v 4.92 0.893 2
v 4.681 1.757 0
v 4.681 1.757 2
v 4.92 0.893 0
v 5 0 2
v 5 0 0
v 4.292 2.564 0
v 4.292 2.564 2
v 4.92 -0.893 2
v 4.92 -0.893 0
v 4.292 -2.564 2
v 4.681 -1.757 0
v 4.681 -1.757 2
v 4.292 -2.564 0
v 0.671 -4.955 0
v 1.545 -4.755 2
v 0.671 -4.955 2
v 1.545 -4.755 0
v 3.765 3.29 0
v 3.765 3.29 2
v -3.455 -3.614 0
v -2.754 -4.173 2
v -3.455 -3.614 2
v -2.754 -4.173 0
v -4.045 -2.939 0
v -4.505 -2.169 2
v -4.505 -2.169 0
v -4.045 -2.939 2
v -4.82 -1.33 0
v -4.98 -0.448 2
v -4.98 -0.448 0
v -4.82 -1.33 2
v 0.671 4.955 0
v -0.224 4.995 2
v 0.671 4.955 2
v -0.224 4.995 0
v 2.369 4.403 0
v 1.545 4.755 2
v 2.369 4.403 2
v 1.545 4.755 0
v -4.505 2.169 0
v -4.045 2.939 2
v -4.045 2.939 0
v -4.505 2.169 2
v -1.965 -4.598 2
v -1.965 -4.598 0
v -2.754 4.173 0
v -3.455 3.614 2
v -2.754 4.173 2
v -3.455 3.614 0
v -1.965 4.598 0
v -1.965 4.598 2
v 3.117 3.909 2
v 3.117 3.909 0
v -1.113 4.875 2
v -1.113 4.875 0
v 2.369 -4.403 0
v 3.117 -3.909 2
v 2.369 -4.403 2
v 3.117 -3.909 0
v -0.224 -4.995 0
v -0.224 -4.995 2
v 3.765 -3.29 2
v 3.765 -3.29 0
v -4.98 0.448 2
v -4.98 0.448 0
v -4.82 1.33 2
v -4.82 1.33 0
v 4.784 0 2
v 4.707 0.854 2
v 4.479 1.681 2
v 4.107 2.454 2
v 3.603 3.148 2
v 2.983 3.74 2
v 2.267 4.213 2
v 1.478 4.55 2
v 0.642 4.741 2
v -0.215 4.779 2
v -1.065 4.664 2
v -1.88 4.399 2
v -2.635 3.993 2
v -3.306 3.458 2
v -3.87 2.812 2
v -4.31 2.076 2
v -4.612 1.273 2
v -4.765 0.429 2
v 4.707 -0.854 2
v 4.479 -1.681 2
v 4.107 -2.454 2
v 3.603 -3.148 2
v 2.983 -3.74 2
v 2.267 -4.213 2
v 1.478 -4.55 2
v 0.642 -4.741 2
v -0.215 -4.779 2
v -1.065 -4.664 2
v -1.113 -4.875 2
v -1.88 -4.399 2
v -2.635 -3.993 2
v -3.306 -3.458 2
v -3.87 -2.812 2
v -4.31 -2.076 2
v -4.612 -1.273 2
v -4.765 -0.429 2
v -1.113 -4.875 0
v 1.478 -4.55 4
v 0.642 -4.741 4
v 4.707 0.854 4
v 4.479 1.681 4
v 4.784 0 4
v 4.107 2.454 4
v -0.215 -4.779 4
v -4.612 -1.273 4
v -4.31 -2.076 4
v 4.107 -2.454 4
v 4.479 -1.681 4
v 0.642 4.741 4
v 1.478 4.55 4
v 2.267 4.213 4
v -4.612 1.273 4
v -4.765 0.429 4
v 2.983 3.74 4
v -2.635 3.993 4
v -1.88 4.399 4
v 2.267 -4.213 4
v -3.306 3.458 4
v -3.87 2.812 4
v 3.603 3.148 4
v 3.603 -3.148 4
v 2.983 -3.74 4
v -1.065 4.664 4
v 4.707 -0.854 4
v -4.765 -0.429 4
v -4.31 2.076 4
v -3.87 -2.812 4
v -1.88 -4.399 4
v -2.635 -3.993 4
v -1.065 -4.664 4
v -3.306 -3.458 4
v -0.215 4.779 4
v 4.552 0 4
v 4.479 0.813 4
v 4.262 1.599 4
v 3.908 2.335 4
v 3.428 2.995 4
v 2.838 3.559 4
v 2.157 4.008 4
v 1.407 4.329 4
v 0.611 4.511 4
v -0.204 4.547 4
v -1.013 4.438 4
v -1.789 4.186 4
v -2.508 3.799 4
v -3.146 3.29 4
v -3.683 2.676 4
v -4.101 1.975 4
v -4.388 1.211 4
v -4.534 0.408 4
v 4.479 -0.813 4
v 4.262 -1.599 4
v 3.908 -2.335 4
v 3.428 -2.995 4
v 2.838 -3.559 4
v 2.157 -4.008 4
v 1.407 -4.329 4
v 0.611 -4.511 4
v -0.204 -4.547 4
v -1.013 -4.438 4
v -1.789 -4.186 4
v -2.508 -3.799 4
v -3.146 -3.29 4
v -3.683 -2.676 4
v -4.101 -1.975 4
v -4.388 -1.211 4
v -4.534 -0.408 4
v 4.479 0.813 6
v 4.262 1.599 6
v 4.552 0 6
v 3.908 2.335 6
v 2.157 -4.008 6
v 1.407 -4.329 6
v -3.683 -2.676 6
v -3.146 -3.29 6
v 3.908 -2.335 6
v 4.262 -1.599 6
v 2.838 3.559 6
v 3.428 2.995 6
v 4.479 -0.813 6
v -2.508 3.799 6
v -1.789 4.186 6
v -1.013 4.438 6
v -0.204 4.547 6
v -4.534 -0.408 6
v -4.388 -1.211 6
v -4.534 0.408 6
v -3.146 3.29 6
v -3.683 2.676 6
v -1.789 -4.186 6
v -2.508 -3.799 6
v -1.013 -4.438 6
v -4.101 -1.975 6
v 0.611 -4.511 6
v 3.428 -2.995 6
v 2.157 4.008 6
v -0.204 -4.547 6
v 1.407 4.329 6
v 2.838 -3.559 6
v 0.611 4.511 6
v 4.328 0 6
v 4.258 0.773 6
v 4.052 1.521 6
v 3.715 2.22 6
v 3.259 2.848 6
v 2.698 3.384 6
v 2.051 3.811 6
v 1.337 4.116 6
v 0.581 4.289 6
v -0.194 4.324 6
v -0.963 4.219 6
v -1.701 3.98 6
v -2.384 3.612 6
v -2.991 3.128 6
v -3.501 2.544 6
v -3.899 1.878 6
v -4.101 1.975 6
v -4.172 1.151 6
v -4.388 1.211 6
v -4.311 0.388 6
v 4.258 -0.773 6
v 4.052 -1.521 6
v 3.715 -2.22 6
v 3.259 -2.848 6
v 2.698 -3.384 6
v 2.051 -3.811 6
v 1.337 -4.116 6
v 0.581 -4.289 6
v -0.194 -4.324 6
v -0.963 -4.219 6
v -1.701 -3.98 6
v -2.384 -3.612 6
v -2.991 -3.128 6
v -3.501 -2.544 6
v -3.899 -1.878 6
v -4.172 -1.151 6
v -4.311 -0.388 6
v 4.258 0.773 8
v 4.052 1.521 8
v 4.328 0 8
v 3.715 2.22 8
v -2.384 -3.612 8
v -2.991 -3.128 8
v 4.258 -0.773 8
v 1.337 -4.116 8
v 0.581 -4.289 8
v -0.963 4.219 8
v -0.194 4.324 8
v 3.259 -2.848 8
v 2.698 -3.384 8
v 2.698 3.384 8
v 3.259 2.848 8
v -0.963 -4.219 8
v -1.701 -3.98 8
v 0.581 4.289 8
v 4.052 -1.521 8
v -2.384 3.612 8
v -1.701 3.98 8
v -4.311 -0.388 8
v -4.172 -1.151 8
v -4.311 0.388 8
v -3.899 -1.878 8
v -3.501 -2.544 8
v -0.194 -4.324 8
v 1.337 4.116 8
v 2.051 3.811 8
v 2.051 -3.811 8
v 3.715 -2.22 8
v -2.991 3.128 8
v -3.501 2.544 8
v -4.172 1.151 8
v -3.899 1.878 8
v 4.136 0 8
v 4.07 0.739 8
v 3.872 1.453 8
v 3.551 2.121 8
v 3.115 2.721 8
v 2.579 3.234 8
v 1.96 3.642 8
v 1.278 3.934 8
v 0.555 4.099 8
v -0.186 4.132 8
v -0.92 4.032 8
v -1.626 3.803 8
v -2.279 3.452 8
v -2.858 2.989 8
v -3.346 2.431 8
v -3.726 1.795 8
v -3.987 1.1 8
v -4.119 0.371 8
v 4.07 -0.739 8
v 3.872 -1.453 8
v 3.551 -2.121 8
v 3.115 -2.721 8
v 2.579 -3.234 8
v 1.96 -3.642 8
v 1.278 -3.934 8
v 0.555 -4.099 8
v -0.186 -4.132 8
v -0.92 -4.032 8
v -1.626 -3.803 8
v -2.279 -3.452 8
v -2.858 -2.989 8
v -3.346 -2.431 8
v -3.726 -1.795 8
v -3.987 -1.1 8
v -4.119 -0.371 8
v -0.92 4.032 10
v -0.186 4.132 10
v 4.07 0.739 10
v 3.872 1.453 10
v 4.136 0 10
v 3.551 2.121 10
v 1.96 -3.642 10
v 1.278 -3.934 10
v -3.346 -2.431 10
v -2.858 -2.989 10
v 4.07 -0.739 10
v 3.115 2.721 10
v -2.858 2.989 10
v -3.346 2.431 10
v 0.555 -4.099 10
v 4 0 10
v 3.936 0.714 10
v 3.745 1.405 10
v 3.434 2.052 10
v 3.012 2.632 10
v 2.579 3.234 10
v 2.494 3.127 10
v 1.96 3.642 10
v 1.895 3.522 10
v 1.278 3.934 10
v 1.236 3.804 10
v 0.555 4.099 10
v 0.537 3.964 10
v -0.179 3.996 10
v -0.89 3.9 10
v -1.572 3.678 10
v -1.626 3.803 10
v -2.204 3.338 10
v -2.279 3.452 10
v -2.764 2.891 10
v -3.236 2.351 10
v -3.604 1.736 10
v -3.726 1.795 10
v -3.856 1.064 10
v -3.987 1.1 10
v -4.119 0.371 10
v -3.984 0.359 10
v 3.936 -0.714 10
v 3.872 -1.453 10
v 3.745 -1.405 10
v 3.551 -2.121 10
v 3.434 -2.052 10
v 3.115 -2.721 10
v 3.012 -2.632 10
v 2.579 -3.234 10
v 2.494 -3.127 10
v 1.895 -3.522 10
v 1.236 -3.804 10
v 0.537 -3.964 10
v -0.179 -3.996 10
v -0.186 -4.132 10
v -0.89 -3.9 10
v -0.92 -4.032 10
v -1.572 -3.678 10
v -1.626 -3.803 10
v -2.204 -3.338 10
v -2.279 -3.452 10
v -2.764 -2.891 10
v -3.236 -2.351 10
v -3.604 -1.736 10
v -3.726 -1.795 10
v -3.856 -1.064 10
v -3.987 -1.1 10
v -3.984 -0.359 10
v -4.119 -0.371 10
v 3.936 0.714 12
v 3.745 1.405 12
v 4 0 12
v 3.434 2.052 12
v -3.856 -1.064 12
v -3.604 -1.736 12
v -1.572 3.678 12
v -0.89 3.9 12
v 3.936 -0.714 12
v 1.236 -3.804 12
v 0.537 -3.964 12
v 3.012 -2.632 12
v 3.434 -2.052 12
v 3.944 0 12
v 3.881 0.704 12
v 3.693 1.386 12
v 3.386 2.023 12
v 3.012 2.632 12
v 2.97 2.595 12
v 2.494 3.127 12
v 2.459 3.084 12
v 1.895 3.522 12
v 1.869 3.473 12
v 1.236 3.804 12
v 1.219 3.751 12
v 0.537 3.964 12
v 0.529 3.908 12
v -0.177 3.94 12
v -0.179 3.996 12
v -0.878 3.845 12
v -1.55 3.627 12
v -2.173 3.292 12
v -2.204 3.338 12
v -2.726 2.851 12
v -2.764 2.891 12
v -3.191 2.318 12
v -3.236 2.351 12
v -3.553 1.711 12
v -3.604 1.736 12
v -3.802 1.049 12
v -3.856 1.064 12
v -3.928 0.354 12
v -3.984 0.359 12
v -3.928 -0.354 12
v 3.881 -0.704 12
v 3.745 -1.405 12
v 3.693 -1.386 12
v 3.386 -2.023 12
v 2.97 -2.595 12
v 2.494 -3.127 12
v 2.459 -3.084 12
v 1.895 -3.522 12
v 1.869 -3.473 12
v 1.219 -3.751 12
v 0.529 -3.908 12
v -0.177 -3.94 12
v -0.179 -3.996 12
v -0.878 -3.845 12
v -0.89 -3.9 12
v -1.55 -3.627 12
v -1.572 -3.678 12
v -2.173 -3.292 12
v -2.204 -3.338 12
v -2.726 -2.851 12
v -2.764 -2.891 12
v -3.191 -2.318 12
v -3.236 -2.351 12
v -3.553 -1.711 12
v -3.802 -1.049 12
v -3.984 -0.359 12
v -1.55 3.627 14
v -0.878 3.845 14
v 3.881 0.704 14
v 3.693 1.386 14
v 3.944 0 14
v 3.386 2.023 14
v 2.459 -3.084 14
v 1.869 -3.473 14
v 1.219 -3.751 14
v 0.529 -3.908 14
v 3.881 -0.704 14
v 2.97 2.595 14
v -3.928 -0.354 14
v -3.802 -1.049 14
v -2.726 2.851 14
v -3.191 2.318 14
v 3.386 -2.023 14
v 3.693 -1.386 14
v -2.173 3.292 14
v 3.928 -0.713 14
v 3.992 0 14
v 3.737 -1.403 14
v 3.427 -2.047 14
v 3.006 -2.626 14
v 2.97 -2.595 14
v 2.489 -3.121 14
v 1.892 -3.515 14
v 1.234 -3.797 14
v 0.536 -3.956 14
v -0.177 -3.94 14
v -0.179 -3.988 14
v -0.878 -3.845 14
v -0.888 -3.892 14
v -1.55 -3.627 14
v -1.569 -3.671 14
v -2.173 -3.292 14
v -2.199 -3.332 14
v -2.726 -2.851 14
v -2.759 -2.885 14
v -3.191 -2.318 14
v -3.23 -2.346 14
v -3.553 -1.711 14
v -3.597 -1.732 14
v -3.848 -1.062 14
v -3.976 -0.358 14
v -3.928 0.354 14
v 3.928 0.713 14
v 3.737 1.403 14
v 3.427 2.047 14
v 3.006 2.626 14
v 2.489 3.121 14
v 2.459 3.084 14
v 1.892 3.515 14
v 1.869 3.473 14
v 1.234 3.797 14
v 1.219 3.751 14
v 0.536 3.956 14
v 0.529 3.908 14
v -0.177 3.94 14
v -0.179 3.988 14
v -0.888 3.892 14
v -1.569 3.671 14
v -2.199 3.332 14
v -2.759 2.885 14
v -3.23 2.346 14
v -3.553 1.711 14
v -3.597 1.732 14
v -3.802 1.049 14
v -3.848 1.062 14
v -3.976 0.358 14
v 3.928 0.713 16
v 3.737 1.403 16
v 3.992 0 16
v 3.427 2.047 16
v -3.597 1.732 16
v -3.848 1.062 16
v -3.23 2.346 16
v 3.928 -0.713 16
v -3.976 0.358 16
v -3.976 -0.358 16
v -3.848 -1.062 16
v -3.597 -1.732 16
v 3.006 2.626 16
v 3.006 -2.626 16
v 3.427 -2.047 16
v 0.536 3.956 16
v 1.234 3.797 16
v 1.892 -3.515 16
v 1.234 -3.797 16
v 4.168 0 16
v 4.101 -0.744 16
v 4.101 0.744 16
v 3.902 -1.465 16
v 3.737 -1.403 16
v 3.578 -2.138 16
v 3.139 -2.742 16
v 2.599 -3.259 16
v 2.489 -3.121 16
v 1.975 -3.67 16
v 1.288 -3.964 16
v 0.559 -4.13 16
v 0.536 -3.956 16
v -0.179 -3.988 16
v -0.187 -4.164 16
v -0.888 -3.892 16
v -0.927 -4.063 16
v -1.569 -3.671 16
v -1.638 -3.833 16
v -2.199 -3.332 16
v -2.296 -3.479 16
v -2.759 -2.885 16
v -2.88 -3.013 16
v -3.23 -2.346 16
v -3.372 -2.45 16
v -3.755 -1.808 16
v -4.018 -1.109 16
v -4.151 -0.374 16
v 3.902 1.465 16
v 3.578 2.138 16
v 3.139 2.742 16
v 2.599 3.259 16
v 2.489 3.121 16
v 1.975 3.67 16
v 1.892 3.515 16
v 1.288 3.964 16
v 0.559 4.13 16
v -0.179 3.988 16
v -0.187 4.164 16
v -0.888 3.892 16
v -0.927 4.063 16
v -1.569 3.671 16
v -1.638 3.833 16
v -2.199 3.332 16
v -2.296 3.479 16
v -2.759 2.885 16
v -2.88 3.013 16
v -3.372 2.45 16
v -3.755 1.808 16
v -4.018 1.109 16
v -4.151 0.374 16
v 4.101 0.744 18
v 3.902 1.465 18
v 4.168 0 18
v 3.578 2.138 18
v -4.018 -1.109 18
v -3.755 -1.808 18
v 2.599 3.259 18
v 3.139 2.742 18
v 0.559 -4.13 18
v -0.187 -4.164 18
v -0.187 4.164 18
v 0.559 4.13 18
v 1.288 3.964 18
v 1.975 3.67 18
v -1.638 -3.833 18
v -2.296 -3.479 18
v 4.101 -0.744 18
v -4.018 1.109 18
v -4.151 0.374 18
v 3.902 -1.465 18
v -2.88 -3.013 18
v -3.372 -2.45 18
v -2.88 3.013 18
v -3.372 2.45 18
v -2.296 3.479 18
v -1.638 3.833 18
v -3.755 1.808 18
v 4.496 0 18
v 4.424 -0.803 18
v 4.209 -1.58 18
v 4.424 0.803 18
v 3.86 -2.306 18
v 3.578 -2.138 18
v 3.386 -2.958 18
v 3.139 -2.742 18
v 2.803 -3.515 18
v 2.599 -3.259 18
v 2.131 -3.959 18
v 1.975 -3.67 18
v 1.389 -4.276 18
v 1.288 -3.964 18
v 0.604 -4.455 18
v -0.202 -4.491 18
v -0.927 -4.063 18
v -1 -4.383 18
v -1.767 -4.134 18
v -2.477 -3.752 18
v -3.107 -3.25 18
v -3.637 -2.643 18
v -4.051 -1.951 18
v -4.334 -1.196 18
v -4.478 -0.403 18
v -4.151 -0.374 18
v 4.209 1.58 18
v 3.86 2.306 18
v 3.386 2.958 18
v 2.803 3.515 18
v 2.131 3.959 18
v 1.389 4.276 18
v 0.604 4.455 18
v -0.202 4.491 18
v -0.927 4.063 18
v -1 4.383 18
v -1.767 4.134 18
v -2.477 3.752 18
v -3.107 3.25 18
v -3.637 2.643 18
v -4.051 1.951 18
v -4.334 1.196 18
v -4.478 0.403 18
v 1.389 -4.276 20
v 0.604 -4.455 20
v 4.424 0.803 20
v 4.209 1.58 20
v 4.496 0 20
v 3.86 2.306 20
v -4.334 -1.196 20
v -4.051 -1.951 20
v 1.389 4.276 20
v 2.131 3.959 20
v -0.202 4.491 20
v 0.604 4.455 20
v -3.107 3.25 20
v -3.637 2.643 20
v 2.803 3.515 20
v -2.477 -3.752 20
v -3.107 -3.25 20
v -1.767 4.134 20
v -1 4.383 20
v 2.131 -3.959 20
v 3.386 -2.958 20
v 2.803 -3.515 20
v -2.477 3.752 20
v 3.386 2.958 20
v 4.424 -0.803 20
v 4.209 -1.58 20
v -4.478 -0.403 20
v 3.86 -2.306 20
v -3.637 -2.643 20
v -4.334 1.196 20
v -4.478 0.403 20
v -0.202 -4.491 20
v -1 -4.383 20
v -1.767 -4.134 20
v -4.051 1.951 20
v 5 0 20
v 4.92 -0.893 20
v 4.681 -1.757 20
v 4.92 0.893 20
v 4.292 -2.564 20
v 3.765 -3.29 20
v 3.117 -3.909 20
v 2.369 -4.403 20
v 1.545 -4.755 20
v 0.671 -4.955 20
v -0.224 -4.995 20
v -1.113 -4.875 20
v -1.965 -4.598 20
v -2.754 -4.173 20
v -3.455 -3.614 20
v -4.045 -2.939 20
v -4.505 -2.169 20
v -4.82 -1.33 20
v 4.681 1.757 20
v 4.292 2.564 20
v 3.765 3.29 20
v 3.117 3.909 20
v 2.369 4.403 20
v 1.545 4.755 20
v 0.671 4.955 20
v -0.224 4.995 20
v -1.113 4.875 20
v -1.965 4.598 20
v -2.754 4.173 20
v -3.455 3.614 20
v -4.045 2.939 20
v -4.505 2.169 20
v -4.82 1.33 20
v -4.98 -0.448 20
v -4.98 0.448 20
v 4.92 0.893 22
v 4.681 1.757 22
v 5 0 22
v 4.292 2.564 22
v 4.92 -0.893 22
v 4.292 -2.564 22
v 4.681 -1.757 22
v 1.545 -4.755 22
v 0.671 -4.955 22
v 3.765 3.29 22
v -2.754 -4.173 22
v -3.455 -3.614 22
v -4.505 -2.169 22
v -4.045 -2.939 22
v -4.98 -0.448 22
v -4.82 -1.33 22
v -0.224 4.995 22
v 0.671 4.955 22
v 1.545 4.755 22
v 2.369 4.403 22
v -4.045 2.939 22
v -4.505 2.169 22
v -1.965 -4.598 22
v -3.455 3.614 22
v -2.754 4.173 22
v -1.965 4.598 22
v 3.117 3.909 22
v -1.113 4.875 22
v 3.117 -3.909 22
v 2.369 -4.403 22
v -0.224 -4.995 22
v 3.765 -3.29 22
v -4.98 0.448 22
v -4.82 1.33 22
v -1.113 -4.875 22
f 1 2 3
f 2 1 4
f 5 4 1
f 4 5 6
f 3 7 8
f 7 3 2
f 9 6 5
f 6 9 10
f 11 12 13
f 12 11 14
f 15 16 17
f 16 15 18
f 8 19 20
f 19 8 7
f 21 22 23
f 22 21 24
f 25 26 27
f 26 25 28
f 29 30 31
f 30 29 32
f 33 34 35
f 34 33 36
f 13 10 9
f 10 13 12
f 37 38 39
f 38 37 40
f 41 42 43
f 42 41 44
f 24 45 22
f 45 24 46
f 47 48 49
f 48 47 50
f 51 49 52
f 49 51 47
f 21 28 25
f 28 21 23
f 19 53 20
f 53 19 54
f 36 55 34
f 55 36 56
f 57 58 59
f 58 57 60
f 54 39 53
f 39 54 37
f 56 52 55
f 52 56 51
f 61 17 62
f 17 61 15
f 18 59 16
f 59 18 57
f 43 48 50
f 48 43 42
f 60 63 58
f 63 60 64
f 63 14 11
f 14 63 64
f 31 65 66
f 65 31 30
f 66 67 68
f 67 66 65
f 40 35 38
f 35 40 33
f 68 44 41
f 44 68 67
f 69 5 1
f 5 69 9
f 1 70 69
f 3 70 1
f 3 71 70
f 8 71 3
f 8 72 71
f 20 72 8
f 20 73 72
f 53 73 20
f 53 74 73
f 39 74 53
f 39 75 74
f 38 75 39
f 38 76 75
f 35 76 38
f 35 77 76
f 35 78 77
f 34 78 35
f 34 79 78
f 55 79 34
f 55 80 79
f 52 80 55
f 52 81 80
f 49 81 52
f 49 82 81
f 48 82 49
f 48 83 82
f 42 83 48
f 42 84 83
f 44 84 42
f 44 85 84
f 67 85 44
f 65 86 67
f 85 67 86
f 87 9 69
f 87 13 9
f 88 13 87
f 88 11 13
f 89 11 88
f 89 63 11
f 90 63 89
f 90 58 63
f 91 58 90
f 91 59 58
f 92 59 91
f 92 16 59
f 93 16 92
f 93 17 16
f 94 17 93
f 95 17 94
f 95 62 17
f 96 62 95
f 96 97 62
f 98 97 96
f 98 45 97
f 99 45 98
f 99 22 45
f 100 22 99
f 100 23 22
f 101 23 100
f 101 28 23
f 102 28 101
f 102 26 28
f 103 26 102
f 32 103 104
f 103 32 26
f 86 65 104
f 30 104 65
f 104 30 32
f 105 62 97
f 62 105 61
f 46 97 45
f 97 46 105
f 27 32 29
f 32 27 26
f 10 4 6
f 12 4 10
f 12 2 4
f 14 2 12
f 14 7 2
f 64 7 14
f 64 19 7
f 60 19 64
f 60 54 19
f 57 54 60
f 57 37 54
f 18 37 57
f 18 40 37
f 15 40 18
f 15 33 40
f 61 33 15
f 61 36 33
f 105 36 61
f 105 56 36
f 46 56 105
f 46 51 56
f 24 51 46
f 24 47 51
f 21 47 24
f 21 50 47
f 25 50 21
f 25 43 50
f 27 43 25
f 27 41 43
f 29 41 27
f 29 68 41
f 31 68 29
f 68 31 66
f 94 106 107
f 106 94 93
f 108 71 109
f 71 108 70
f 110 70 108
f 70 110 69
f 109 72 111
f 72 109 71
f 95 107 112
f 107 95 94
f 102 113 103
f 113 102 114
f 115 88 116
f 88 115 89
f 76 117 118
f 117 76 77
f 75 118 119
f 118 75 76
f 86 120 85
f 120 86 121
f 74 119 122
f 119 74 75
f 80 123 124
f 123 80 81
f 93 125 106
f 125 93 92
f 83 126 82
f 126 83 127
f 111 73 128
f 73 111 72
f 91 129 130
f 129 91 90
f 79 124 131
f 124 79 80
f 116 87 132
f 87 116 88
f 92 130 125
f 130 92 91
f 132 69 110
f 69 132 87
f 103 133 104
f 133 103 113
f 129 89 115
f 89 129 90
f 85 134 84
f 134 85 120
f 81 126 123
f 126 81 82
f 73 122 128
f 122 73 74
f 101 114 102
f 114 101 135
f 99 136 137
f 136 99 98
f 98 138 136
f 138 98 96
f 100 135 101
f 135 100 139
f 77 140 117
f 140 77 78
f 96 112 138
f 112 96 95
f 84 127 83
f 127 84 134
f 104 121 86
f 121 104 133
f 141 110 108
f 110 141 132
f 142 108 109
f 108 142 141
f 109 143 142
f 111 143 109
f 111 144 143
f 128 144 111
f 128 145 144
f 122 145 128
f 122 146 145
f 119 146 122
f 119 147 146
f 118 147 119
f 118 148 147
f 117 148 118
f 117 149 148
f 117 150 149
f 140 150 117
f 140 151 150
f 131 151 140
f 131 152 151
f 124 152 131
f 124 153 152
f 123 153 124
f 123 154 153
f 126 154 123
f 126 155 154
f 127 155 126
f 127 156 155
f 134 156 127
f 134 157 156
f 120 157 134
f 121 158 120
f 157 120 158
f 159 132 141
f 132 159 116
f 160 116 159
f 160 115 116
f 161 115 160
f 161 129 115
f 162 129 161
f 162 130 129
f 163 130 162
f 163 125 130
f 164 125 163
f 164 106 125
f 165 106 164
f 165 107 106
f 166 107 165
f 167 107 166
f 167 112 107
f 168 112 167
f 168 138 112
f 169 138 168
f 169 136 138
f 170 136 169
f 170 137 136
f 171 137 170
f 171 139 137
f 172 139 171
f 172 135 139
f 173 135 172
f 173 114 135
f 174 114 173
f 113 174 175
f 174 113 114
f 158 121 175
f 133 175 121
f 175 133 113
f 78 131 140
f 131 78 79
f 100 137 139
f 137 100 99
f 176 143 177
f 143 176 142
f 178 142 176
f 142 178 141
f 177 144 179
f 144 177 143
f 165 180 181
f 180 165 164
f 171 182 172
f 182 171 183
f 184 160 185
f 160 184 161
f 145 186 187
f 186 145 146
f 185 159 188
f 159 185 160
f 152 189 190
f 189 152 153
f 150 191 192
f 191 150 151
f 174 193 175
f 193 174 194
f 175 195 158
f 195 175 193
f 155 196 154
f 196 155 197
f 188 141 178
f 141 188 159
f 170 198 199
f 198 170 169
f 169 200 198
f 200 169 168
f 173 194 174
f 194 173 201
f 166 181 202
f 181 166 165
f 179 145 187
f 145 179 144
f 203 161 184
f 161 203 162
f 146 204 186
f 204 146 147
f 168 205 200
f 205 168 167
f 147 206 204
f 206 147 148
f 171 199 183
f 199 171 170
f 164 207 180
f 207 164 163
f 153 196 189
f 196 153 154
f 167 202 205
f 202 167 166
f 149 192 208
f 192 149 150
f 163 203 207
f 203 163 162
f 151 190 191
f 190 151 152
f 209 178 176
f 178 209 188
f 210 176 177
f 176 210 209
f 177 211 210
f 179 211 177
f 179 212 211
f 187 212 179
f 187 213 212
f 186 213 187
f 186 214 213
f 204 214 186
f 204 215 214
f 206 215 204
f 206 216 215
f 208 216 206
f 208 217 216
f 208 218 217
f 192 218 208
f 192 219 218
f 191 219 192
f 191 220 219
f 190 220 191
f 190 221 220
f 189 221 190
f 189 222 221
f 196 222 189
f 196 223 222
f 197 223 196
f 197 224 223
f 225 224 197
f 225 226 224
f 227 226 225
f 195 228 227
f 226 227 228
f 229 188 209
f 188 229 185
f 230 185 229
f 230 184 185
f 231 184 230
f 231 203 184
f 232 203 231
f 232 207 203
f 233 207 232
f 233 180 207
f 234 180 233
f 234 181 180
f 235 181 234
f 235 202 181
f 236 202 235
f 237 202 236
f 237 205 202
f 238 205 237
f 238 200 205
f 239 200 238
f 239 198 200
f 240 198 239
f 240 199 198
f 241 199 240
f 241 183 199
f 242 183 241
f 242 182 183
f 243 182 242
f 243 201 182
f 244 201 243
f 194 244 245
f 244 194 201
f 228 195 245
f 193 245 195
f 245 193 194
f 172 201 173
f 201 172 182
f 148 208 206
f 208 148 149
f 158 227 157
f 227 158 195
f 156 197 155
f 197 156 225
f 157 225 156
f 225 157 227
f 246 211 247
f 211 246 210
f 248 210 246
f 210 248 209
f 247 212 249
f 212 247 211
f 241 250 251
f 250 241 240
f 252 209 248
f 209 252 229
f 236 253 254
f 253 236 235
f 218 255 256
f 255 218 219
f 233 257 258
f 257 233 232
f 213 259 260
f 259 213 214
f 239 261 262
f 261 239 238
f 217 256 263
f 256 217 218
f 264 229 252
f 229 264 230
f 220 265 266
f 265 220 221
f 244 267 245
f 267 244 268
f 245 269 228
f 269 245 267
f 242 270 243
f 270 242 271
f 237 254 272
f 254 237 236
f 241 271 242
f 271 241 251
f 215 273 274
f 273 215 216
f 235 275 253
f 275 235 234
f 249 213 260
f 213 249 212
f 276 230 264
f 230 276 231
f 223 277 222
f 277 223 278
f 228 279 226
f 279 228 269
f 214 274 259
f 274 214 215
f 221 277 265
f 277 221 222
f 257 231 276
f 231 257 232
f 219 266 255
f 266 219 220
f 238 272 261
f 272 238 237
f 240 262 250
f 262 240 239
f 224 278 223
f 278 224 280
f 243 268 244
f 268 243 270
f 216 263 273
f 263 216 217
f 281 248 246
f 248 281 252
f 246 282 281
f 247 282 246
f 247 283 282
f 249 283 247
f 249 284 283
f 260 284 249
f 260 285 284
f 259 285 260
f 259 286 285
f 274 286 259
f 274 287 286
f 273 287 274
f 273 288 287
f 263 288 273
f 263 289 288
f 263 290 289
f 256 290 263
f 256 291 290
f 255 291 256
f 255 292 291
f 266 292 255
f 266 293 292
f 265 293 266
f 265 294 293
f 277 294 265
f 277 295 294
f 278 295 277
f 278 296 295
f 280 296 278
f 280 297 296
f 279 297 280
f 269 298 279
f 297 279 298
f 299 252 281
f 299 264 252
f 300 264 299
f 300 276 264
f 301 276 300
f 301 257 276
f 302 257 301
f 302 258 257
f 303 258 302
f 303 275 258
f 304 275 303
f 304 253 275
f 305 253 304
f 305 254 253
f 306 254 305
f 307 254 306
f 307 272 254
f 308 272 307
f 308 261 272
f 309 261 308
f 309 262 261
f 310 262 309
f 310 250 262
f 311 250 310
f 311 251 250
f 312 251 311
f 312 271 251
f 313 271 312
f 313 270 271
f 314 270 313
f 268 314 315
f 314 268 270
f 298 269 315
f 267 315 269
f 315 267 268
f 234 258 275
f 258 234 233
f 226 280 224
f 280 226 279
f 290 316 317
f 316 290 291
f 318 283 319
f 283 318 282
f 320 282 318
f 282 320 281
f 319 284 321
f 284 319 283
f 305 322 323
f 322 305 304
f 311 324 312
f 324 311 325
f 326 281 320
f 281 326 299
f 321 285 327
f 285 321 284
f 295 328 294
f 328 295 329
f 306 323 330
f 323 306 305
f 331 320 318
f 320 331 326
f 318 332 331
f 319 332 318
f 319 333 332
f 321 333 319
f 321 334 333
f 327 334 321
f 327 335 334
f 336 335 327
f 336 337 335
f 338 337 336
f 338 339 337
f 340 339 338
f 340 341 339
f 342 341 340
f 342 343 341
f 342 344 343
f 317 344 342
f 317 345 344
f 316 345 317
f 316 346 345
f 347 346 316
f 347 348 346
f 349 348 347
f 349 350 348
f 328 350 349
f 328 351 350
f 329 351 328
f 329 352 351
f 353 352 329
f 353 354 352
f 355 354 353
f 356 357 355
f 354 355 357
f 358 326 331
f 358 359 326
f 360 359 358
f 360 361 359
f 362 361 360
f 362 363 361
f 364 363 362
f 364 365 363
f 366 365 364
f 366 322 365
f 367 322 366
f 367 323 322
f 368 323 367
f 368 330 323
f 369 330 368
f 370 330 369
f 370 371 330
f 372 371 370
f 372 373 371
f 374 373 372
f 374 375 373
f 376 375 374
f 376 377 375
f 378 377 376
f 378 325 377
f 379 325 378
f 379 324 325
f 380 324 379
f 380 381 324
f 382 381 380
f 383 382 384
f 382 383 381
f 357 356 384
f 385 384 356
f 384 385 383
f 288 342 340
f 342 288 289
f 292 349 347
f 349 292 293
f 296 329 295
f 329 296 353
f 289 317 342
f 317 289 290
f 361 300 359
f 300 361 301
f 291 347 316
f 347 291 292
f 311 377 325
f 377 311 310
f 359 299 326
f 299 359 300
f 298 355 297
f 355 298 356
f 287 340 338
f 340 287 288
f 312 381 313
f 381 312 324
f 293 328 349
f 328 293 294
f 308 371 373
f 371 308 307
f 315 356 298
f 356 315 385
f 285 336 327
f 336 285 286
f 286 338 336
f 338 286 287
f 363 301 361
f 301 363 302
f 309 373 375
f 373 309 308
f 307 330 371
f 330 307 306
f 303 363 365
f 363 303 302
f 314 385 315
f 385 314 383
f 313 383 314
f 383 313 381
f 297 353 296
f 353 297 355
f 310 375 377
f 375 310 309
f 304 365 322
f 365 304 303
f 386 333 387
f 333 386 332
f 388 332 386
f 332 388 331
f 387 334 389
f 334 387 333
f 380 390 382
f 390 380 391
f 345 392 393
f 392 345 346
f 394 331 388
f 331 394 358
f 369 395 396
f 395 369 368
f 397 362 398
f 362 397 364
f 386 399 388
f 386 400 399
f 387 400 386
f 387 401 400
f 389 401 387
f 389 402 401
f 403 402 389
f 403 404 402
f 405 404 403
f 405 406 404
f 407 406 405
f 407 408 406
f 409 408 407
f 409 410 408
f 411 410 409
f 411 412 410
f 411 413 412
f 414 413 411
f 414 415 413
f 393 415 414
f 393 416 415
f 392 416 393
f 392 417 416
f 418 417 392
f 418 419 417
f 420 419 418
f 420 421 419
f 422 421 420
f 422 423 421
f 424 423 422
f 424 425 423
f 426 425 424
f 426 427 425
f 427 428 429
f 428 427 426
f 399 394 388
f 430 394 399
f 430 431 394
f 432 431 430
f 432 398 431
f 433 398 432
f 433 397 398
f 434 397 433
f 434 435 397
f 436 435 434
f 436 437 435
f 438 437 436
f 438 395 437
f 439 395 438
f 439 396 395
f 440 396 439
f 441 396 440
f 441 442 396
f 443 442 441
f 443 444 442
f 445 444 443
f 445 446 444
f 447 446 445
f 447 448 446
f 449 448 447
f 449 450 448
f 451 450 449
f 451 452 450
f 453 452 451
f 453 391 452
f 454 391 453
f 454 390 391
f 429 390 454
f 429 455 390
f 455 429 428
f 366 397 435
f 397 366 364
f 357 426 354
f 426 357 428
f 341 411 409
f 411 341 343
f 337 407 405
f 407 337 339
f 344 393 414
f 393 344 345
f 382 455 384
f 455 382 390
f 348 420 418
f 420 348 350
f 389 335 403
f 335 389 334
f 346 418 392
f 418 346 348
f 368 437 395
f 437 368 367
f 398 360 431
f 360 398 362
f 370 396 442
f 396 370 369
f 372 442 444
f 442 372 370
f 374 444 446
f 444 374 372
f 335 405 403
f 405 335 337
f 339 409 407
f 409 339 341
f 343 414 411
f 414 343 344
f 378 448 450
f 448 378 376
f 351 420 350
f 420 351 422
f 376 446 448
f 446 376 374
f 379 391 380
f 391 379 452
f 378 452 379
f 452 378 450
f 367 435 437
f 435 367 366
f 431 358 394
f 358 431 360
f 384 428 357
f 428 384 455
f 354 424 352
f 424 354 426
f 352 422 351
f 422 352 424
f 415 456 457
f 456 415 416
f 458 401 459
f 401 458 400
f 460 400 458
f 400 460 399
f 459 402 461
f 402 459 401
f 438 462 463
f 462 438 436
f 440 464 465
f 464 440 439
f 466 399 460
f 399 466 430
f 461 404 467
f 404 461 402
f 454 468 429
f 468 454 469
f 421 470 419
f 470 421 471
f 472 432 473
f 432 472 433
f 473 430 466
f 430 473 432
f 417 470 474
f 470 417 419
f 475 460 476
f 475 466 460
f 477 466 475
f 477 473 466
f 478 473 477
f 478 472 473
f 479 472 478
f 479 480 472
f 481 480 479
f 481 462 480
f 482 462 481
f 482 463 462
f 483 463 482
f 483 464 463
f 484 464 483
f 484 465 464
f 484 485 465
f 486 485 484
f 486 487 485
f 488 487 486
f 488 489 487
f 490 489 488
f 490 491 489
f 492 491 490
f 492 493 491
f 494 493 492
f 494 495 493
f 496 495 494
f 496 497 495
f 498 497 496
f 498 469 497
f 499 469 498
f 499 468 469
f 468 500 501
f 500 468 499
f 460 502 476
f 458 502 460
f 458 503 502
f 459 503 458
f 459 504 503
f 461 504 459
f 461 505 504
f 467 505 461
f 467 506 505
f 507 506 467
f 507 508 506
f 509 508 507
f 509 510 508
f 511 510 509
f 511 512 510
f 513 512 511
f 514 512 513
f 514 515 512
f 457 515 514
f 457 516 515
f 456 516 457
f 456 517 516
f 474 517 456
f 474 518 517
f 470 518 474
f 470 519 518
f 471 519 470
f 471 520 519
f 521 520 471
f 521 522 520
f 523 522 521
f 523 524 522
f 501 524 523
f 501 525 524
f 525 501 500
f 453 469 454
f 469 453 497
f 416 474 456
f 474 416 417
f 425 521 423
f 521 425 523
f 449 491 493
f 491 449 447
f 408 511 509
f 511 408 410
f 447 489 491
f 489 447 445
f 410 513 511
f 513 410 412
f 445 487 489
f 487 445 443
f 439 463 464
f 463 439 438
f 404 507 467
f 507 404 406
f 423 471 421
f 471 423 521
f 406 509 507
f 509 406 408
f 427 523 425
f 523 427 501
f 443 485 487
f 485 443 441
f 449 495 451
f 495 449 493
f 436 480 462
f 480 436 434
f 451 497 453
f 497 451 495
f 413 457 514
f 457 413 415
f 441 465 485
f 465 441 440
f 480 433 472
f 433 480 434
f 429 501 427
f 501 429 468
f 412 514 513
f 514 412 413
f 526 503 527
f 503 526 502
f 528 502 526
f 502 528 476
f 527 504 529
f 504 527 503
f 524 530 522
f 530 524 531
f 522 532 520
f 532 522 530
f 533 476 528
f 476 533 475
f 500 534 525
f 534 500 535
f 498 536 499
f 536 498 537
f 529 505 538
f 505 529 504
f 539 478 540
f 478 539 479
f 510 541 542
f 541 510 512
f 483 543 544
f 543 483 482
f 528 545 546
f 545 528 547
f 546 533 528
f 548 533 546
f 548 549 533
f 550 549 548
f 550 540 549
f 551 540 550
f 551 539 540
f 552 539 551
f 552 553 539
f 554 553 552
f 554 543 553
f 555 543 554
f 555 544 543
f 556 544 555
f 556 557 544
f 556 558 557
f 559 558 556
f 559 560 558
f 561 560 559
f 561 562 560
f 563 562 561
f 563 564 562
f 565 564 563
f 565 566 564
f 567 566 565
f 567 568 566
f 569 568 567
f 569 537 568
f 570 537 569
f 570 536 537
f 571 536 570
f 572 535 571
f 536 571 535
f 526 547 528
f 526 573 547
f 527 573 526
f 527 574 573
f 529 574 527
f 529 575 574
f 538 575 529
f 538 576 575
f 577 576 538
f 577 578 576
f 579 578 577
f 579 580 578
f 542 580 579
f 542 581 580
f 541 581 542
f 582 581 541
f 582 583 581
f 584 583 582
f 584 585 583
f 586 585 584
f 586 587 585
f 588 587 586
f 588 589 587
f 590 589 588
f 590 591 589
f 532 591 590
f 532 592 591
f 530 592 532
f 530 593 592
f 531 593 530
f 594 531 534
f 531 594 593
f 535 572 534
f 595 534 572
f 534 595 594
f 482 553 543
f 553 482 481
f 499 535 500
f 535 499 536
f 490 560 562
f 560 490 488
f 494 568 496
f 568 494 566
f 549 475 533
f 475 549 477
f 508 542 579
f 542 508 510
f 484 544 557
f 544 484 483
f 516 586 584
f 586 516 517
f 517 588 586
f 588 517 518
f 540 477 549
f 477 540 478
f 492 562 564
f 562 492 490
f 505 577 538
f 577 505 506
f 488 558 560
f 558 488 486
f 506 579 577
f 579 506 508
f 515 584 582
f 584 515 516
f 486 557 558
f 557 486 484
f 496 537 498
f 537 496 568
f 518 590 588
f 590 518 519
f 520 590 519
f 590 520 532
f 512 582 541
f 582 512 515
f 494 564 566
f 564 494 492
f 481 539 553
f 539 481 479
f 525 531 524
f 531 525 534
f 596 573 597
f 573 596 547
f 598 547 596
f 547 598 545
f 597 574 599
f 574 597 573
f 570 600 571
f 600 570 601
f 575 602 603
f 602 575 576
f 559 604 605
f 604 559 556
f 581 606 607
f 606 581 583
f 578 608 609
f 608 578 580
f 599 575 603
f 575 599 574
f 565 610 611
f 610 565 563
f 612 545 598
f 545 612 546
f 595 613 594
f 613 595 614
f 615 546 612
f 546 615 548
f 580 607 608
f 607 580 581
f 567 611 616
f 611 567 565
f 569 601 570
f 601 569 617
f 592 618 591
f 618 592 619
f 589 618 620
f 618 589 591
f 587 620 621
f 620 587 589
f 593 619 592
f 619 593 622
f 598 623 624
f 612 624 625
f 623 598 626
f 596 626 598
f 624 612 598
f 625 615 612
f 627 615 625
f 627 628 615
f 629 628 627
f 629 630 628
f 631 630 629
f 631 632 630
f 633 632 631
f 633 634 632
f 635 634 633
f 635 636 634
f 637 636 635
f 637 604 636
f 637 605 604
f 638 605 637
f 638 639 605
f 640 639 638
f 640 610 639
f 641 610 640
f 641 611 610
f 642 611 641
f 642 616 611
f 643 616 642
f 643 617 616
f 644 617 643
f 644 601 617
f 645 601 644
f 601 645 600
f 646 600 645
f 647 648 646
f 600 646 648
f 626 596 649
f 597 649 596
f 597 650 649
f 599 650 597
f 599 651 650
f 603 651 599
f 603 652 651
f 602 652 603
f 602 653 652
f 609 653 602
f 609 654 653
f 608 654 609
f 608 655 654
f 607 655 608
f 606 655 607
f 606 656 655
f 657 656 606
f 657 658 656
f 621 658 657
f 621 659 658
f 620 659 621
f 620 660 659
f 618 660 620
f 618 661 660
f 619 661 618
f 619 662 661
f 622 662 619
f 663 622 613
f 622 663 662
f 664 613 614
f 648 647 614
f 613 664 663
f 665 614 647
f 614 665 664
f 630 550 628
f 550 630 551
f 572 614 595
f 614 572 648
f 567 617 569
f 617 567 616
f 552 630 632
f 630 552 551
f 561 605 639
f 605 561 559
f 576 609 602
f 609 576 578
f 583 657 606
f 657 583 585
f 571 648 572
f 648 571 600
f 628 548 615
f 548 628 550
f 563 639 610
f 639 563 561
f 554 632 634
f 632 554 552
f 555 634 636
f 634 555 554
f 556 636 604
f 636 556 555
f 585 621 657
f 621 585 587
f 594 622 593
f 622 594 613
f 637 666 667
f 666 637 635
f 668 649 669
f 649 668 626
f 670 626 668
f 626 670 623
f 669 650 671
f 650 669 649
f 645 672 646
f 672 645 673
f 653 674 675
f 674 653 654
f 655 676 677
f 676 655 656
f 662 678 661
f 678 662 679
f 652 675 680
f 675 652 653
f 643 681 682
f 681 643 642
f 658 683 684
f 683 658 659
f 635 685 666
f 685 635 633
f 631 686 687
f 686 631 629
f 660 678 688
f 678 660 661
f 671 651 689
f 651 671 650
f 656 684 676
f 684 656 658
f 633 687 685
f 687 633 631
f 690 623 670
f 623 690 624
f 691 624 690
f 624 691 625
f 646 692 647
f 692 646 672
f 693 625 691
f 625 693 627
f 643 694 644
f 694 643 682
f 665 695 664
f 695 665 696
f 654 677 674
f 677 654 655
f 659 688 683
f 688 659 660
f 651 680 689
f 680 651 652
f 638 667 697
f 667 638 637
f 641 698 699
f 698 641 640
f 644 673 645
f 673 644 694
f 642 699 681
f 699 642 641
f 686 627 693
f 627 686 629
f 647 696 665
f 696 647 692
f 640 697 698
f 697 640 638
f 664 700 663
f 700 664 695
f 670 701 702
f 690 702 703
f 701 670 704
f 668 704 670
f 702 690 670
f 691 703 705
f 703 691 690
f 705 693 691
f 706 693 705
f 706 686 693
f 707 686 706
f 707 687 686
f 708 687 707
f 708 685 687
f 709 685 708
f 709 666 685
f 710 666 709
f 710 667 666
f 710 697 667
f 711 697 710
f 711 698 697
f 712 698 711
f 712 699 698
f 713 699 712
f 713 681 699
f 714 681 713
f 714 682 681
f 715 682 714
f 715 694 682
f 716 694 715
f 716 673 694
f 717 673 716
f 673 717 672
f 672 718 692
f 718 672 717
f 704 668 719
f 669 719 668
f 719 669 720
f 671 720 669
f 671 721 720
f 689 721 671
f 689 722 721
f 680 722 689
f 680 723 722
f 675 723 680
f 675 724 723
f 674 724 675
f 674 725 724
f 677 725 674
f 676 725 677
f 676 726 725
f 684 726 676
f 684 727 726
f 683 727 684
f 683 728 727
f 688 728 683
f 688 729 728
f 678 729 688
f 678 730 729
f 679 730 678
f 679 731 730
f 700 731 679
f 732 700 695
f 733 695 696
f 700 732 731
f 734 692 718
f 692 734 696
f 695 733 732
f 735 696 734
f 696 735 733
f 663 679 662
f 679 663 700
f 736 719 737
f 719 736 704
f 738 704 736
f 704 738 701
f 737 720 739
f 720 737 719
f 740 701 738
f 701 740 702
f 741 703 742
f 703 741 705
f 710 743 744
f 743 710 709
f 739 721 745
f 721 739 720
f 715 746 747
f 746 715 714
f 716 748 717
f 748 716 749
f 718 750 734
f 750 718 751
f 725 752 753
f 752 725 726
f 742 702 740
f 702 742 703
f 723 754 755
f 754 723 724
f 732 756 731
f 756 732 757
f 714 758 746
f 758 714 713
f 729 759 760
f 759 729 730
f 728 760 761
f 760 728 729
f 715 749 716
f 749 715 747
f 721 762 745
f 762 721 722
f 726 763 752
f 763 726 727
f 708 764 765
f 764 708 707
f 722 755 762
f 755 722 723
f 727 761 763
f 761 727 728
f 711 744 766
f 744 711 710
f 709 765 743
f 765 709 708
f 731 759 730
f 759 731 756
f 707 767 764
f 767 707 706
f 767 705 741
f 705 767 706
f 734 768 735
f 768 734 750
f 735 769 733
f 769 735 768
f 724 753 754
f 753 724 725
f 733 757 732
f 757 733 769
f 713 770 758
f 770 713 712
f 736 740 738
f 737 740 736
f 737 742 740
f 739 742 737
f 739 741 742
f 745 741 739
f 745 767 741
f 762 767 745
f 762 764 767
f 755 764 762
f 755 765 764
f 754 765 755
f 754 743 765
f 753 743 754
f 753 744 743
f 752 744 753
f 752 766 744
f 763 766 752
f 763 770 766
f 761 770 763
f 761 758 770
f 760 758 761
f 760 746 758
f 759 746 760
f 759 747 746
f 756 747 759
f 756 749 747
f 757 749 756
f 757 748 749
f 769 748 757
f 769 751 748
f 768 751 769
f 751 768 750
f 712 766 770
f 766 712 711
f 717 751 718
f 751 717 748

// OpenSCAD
$fn=35;

module pinViaHeight(height, bottomDia, topDia, res, topForce, bottomForce) {
    /*height = 20;
    bottomDia = 7;
    topDia = 8;
    res = 90;
    topForce = 4;
    bottomForce = 3;*/

    echo();

    heightPerSlice = height/res;
    echo("heightPerSlice", heightPerSlice);
    /*
    //top and bottom slices
    cylinder(d=topDia, h=heightPerSlice);
    translate([0,0,height-heightPerSlice]) {
        cylinder(d=topDia, h=heightPerSlice);
    }
    */

    //middleSlices fixed values
    numberOfSlices = res;
    echo("numberOfSlices", numberOfSlices);

    bottomTotopDiaDifference = topDia-bottomDia;
    echo("bottomTotopDiaDifference", bottomTotopDiaDifference);

    DiaIncreaseFactorPerSlice = bottomTotopDiaDifference/(numberOfSlices);
    echo("DiaIncreaseFactorPerSlice", DiaIncreaseFactorPerSlice);

    forceSum = topForce+bottomForce;
    forceTop = topForce/forceSum;
    forceBottom = bottomForce/forceSum;

    echo ("forceSum",forceSum,forceTop,forceBottom);

    for(i= [0:numberOfSlices]) {

        /*forces are interpreted this way:
                                /\
                                || topForce
                                ||
                        ==================  <-- Slice
                        ==================
                                ||
                                || bottom force
                                \/
        */
        dia = DiaIncreaseFactorPerSlice*i+bottomDia;
        forcePartTop = (i/numberOfSlices)*forceTop;
        forcePartBottom = (1-(i/numberOfSlices))*forceBottom;
        p = forceSum*(forcePartTop+forcePartBottom);
        
        //function: f(i)= (-(1/(res/2))*(i-(res/2))^2+(res/2))/(res/2) --> starts and ends at top&bottom slice (=0), highest point at res/2 = 1

        echo("slice",i,p,forcePartTop,forcePartBottom);

        translate([0,0,heightPerSlice*i]) {
            cylinder(d=dia-(((-(1/(res/2))*((i-(res/2))*(i-(res/2)))+(res/2))/(res/2))*p), h=heightPerSlice);
        }
    }

    echo();
}


pinBottomDia = 10;


/*
//example

cube([20,20,2]);
translate([0,0,2]) {
    for(o= [1:20/pinBottomDia]) {
        translate([o*pinBottomDia-pinBottomDia/2,0,0]) {
            for (u= [1:20/pinBottomDia]) {
                translate([0,u*pinBottomDia-pinBottomDia/2,0]) {
                    pinViaHeight(20, pinBottomDia, pinBottomDia, 200, 5, 3);
                }
            }
        }
    }
}
translate([0,0,22]) {
    cube([20,20,2]);
}
*/

pinViaHeight(20, pinBottomDia, pinBottomDia, 10, 3, 1);
